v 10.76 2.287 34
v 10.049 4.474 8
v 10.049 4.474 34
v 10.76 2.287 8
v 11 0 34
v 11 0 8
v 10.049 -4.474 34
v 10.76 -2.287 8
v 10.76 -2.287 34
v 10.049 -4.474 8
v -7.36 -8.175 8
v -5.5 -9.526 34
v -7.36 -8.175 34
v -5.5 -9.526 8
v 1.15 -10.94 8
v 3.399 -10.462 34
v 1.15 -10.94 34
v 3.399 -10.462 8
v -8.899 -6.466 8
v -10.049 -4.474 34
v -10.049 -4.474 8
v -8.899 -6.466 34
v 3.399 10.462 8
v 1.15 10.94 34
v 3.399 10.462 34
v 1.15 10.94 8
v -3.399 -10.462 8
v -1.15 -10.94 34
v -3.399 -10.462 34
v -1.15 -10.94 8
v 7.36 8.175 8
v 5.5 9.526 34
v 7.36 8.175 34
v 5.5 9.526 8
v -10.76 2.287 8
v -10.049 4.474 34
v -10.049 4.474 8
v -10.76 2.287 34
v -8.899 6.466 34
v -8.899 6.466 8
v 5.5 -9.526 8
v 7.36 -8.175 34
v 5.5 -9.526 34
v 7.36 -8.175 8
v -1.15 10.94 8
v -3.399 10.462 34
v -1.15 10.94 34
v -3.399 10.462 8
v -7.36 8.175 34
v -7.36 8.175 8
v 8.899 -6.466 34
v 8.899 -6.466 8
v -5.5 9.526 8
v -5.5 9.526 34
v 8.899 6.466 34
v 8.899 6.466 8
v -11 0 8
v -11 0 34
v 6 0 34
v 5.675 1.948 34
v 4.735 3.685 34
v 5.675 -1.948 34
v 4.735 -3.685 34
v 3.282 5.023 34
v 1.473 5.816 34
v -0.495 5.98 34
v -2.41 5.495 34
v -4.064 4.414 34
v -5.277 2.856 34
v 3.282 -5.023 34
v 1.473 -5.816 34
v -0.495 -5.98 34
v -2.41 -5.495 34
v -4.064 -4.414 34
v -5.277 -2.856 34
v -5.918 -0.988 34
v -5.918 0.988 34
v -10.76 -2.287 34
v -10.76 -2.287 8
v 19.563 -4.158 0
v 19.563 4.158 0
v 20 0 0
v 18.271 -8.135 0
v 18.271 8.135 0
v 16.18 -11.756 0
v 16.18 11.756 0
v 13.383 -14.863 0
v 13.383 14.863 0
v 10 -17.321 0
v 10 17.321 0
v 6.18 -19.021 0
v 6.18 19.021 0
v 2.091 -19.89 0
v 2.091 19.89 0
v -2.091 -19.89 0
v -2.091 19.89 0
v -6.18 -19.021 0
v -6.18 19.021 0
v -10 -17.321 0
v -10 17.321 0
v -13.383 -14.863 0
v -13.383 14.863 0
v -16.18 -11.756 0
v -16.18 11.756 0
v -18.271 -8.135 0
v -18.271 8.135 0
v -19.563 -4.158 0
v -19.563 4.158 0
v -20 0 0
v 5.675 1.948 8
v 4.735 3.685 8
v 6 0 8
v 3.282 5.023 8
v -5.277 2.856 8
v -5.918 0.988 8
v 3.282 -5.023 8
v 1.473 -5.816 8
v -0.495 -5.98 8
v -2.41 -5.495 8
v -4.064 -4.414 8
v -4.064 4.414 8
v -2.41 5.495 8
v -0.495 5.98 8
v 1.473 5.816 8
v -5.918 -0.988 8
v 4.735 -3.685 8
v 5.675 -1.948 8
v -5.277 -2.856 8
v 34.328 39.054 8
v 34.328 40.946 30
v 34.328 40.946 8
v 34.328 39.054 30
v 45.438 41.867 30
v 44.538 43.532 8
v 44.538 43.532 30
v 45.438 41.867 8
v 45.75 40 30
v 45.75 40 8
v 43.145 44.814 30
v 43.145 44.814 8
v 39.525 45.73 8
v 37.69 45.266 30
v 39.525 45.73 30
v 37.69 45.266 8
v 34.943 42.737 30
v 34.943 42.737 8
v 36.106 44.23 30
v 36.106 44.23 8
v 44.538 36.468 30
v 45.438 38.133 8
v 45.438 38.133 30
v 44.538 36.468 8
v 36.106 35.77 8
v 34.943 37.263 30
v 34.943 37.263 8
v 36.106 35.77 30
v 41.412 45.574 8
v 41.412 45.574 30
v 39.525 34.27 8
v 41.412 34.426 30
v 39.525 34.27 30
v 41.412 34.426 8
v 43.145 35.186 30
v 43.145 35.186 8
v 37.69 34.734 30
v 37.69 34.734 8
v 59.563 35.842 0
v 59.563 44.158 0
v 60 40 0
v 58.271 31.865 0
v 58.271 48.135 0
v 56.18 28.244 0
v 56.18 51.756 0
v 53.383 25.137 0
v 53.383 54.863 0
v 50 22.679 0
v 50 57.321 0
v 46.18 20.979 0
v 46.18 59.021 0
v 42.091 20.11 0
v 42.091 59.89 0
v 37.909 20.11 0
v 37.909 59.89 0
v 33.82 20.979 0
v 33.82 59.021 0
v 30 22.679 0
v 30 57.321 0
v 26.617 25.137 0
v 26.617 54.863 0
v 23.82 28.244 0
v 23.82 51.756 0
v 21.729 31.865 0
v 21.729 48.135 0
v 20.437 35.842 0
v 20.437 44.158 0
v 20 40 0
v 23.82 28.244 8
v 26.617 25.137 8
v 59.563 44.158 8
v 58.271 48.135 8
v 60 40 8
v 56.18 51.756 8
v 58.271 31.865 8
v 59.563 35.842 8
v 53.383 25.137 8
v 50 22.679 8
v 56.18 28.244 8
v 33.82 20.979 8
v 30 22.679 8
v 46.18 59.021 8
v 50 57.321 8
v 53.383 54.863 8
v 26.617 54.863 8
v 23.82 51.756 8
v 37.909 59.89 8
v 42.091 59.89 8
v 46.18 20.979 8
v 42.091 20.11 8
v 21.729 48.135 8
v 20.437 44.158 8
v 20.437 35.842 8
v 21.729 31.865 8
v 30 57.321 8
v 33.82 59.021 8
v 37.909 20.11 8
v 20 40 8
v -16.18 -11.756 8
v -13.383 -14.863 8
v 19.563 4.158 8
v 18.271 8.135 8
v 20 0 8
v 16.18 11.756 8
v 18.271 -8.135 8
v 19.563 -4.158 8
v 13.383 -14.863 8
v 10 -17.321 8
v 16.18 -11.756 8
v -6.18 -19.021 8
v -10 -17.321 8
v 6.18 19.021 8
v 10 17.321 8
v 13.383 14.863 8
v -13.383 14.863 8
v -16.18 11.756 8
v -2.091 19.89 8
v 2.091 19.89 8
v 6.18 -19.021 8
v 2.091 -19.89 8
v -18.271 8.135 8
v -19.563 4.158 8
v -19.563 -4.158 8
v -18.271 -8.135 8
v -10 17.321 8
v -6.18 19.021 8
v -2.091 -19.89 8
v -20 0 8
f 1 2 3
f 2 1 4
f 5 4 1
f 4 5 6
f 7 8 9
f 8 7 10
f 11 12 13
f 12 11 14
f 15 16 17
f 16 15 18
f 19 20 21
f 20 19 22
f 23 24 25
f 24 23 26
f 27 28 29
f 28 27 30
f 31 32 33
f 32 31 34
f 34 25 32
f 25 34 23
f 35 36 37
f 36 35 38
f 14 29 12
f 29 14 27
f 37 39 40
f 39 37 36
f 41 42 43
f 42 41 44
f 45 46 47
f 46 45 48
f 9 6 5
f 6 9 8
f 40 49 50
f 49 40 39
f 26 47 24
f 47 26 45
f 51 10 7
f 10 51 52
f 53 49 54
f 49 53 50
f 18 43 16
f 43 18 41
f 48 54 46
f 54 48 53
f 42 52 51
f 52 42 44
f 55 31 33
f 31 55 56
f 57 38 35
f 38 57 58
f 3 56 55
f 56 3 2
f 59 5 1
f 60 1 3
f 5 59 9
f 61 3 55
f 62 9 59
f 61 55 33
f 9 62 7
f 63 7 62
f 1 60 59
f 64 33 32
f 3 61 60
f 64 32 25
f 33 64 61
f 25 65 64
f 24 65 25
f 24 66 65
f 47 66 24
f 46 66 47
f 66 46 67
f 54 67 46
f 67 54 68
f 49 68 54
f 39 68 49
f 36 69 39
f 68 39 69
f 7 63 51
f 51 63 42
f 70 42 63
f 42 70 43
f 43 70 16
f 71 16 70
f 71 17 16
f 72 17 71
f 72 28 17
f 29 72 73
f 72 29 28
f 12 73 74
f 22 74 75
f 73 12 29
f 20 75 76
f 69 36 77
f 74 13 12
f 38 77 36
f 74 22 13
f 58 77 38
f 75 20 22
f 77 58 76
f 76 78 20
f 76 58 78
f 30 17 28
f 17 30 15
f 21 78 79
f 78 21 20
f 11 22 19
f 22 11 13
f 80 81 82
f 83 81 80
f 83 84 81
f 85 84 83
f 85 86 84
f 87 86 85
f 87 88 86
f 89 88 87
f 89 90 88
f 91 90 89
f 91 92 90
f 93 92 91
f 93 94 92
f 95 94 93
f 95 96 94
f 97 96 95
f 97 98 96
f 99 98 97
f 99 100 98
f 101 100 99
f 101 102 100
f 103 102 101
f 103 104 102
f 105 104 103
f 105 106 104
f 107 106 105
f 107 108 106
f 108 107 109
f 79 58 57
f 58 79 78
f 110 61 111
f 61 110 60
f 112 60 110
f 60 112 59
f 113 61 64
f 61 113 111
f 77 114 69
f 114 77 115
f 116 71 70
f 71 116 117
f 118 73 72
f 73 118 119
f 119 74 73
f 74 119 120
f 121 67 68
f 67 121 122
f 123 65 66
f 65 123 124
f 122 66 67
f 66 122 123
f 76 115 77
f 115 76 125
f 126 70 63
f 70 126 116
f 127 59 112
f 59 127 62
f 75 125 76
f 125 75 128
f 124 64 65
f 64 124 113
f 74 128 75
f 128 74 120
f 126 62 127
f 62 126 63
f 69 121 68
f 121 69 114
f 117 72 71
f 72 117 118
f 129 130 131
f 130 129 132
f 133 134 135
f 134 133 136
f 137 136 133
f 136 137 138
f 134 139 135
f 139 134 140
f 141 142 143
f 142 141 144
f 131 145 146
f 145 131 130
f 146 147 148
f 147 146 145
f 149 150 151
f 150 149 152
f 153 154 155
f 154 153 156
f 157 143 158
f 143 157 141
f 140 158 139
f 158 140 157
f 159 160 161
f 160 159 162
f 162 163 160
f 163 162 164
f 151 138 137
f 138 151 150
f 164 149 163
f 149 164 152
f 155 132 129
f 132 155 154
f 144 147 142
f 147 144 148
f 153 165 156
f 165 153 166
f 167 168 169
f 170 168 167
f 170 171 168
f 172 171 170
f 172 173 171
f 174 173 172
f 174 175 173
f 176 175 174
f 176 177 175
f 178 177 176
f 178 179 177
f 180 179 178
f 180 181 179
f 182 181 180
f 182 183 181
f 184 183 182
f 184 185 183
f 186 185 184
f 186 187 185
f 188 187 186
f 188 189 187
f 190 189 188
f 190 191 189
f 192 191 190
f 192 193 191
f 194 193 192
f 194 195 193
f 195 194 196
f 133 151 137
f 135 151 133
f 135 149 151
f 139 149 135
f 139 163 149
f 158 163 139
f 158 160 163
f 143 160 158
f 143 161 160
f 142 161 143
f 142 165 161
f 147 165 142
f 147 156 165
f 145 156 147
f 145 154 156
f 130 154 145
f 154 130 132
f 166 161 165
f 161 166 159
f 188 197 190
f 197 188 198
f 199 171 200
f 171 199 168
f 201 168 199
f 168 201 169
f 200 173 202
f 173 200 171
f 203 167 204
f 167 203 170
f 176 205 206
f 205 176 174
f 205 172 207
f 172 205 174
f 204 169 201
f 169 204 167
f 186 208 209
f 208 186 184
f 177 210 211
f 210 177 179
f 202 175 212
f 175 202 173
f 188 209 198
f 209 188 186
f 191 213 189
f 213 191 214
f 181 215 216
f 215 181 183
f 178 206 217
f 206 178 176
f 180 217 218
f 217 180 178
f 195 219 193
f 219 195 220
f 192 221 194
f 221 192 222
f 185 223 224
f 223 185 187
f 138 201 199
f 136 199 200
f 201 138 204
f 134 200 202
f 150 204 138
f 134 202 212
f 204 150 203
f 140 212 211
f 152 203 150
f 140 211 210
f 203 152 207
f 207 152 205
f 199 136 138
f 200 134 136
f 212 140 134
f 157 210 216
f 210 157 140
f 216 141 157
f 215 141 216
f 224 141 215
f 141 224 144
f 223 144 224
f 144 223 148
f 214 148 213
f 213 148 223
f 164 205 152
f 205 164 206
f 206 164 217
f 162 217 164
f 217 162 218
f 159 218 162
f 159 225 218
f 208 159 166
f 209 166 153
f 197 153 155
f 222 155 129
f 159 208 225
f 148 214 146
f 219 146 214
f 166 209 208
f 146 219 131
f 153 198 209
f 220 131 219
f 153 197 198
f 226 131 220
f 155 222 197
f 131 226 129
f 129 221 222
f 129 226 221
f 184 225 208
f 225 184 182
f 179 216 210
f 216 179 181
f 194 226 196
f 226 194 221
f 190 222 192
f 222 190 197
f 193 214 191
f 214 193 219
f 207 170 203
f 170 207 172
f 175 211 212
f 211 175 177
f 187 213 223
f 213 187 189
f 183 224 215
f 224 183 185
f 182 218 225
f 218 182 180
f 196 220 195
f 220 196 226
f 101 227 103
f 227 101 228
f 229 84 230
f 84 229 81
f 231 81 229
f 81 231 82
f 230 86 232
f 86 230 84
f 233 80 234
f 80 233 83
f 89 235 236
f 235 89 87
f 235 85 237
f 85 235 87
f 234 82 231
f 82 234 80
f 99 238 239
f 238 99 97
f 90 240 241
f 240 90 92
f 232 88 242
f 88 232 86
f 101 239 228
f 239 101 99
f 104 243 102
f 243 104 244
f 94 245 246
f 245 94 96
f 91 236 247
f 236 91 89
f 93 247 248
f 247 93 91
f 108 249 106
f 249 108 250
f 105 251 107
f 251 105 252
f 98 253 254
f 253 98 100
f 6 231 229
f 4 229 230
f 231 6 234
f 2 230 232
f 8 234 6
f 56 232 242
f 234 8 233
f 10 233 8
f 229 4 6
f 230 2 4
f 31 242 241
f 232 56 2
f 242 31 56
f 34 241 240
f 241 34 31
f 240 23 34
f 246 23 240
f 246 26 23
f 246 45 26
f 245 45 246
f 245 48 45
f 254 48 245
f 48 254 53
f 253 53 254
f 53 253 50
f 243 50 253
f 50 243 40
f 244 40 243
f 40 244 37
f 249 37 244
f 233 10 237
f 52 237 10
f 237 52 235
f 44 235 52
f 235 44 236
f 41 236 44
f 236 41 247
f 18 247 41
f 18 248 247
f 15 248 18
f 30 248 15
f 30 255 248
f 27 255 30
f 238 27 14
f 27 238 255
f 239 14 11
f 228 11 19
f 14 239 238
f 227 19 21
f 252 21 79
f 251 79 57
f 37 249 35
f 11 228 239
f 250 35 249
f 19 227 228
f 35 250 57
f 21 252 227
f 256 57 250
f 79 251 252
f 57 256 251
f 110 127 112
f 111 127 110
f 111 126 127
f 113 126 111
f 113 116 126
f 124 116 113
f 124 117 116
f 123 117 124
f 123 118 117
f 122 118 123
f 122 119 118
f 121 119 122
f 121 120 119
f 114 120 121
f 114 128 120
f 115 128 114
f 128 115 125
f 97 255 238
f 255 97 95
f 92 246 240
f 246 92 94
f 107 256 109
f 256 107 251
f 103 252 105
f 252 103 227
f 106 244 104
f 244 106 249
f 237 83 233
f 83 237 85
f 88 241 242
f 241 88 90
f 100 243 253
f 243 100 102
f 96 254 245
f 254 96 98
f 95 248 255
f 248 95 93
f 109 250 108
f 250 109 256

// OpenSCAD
dia_tubo=22;
H_tubo=26;
dia_foro=12;
dia_tappo=40;
H_tappo=8;

// cilindro cavo
difference() {
cylinder(r=dia_tubo/2, h=H_tubo+H_tappo, center=false);
cylinder(r=dia_foro/2, h=H_tubo+H_tappo+1, center=false);
}
// allargamento tappo
cylinder(r=dia_tappo/2, h=H_tappo, center=false);

// chiusura esteremità aperta
translate([dia_tappo, dia_tappo, 0]) {
cylinder(r=dia_foro/2-0.25, h=30, center=false);
cylinder(r=dia_tappo/2, h=H_tappo, center=false);
}
